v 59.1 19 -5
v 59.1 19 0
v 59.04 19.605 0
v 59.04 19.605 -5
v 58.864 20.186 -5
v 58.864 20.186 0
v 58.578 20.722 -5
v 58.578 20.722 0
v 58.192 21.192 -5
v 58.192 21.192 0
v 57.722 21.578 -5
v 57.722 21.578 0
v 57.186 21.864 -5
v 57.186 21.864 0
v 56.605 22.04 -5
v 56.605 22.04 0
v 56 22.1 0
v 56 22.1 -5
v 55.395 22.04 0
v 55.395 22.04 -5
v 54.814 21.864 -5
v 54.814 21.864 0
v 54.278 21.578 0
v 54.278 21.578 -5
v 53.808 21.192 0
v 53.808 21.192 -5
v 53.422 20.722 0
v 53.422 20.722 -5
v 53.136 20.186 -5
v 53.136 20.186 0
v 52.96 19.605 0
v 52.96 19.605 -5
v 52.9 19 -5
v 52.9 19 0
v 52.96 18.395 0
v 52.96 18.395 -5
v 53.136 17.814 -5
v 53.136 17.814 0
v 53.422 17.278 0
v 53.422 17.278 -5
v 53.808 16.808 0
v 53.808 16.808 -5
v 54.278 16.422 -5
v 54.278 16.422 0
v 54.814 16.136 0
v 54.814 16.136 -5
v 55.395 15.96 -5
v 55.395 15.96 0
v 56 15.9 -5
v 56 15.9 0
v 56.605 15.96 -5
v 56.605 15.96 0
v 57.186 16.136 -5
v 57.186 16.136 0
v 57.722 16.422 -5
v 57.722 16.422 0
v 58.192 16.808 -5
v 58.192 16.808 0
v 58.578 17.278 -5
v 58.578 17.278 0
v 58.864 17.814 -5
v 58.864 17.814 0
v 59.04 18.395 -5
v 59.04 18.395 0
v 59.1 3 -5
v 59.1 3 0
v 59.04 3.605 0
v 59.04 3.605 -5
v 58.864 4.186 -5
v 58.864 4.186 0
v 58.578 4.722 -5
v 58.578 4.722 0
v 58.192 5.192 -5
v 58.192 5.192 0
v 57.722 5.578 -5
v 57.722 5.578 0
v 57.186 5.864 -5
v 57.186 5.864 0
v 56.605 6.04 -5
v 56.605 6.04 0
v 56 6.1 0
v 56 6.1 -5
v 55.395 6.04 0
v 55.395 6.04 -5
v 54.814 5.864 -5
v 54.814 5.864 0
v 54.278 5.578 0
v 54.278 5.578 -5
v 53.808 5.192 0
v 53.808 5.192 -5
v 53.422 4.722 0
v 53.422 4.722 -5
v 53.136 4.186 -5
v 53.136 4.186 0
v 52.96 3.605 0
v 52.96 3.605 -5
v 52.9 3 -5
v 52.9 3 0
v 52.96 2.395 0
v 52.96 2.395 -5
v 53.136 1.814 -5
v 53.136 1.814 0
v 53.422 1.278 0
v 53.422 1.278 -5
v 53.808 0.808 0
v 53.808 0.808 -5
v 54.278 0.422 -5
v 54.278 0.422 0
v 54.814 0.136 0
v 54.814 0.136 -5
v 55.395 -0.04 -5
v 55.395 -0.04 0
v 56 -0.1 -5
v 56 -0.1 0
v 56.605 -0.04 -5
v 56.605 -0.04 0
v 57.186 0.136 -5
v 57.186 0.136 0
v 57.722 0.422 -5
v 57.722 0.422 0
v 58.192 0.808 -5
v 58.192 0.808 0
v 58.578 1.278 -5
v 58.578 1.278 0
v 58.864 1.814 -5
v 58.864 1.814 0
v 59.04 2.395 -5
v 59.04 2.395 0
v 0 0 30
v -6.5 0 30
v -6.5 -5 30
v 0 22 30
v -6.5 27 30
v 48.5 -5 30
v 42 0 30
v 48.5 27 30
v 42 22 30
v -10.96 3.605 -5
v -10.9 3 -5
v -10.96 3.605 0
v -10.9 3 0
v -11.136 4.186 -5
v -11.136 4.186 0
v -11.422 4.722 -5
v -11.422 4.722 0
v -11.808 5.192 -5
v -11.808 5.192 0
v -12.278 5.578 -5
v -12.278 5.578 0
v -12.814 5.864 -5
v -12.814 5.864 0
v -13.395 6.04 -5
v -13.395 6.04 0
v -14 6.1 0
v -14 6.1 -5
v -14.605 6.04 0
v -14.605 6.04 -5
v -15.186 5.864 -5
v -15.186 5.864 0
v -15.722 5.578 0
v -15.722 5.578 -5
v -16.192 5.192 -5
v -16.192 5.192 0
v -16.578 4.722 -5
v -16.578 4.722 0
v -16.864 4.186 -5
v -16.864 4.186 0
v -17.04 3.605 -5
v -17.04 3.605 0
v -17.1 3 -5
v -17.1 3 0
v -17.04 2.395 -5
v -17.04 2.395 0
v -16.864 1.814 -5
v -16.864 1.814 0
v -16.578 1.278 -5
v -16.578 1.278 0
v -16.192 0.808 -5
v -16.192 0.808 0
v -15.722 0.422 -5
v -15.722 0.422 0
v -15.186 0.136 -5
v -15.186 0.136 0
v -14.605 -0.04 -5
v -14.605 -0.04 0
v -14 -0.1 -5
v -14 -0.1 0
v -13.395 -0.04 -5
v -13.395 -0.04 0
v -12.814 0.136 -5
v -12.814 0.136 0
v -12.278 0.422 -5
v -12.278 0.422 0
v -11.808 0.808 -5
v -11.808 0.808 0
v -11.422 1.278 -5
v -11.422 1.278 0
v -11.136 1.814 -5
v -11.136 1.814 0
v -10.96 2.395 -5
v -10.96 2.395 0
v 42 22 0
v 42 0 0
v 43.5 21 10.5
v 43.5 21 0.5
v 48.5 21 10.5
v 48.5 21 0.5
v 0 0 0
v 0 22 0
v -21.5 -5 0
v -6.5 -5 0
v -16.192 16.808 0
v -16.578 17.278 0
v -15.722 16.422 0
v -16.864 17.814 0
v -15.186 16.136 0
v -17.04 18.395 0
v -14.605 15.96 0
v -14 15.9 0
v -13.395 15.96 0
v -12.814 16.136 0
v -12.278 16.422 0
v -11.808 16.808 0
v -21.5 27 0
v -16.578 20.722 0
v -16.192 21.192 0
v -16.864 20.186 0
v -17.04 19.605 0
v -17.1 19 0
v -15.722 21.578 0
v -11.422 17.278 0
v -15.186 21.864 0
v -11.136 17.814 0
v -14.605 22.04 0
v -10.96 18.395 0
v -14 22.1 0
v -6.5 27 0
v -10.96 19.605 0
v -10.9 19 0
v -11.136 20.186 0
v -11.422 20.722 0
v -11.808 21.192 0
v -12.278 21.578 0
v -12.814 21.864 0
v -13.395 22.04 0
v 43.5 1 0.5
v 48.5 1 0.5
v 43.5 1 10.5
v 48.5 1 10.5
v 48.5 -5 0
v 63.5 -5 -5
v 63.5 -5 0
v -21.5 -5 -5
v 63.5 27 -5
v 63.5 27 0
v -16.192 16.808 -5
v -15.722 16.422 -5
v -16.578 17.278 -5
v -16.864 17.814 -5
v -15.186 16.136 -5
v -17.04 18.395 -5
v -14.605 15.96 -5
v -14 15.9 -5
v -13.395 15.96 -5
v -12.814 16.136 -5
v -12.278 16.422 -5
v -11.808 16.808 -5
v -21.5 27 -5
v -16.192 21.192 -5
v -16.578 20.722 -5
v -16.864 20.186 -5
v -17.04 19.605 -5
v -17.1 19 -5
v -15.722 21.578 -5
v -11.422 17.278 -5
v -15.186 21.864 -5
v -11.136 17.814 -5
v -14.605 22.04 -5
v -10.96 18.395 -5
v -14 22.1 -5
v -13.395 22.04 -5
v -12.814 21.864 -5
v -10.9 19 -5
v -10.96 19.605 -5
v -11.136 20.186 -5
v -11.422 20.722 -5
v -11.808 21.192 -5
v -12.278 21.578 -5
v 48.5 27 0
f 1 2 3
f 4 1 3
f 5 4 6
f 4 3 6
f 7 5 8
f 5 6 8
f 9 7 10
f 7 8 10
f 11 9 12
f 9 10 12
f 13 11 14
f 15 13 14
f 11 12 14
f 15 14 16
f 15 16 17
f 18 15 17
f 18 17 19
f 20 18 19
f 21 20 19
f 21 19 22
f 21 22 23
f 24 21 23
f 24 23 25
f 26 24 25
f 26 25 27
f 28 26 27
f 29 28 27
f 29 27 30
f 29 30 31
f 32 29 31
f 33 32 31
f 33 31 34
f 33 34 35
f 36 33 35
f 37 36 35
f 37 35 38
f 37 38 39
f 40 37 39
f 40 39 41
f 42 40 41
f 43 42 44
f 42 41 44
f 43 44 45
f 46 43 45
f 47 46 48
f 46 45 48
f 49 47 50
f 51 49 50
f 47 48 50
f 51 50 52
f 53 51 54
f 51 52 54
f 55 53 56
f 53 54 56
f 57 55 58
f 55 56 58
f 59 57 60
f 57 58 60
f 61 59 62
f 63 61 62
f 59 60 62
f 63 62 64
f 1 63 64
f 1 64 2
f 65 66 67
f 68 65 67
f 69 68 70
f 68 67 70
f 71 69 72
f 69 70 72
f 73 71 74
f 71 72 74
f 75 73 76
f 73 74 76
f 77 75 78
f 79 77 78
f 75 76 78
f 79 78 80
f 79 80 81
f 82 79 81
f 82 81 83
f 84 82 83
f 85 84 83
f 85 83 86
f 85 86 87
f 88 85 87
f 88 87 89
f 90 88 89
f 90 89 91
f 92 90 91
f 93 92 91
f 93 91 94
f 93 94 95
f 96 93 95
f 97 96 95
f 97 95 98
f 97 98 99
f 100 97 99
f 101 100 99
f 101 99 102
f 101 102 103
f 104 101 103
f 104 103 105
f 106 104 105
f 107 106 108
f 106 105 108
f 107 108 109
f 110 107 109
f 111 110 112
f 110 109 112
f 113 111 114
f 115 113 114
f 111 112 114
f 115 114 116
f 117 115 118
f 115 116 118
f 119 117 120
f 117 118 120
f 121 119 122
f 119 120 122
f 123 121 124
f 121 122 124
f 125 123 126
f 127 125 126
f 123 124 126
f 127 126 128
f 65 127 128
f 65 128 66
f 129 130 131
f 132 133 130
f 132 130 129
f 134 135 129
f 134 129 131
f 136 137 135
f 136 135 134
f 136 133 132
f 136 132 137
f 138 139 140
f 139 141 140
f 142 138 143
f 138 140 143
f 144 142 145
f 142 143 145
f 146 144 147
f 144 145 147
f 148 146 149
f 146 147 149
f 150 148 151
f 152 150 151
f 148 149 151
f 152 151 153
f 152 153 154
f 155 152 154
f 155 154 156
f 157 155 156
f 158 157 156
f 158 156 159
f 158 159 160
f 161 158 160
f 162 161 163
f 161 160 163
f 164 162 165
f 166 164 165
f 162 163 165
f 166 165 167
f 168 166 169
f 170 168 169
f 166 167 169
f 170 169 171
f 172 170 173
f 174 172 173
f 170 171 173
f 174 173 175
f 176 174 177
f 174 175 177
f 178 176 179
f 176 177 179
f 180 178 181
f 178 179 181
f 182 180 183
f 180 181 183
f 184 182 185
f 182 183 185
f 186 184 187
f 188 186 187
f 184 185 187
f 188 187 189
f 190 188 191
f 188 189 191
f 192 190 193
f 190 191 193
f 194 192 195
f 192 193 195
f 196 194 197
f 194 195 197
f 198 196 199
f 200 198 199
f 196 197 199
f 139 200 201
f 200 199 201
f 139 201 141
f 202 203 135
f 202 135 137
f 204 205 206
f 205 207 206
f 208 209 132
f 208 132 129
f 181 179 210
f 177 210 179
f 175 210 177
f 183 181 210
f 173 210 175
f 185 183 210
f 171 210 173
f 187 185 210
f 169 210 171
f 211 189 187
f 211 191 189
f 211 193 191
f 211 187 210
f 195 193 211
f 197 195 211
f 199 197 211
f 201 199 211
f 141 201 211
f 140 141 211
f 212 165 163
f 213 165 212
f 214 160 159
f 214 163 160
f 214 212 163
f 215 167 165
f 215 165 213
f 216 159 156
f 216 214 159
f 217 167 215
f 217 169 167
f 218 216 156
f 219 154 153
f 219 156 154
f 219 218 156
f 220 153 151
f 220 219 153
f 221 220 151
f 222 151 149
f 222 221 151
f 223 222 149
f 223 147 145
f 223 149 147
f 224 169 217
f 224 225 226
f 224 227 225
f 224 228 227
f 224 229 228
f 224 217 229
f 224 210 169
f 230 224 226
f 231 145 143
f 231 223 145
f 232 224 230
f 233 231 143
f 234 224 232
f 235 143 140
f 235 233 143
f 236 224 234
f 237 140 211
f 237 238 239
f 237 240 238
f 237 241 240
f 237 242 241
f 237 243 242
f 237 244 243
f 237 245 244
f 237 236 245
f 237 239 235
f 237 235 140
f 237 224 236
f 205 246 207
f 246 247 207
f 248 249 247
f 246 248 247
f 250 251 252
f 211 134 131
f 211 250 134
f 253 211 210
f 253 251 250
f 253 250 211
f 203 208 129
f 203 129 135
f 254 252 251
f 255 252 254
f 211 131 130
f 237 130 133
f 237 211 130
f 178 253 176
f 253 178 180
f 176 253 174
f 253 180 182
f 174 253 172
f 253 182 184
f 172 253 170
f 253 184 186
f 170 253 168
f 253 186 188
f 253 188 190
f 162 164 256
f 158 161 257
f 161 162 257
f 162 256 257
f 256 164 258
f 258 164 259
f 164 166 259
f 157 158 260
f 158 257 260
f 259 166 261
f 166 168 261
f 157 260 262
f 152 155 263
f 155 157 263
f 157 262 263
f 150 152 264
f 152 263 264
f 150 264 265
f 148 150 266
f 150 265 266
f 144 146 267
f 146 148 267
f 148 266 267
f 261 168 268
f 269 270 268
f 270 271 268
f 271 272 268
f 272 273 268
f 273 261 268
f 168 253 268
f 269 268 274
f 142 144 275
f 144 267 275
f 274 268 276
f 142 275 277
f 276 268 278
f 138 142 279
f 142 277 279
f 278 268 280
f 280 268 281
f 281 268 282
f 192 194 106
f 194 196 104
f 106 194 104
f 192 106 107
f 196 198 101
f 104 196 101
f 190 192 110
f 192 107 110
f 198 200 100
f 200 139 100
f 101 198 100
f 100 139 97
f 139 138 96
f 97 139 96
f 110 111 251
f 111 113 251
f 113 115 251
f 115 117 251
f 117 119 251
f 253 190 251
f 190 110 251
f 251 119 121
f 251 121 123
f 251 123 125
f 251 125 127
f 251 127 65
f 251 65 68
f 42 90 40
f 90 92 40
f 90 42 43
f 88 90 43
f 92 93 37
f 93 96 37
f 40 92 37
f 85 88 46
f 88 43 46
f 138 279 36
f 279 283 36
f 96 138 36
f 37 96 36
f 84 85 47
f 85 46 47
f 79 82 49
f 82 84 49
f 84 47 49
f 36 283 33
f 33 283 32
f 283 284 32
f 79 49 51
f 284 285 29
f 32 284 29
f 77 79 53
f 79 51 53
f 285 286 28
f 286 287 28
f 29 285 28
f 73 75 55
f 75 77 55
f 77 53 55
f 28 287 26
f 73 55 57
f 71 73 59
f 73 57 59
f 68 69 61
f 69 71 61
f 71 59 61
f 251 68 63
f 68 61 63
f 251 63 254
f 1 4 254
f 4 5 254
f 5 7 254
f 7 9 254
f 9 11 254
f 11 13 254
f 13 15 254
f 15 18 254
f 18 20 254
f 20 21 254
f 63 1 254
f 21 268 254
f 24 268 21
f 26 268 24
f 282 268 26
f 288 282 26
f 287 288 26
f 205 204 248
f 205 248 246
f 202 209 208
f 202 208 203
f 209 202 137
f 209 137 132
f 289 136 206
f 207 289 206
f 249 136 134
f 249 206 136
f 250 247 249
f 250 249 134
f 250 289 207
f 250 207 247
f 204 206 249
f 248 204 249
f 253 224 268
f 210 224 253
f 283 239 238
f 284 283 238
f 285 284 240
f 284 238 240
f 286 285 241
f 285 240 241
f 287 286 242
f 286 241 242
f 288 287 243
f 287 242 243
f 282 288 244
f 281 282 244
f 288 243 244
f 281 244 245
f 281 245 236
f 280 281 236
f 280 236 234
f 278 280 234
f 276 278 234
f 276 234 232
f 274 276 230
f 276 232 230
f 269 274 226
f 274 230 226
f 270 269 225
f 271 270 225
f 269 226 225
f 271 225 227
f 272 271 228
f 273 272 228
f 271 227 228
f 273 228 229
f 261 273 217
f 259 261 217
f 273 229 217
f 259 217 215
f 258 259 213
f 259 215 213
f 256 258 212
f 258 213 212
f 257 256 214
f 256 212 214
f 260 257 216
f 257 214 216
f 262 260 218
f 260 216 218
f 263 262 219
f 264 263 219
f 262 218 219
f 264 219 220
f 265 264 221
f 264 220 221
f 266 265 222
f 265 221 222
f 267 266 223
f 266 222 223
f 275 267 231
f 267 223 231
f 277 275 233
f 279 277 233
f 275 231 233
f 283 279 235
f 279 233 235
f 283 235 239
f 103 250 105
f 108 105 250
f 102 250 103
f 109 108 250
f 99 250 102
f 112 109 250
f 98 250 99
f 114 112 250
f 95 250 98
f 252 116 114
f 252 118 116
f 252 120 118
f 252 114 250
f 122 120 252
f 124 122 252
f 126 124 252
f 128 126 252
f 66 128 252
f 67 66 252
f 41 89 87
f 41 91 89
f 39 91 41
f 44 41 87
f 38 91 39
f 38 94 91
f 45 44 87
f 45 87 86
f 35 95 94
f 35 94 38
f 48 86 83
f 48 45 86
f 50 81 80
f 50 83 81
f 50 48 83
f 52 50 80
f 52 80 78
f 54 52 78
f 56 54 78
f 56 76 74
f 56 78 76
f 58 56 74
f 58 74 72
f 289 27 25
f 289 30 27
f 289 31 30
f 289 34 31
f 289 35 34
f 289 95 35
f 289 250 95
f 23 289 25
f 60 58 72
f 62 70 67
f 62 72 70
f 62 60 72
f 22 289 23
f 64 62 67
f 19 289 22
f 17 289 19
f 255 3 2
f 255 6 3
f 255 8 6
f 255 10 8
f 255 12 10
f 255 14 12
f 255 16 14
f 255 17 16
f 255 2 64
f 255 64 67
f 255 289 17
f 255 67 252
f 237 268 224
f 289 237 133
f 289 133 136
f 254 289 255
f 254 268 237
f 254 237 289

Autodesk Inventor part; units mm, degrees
ref_plane "YZ Plane" through (0, 0, 0) normal (1, 0, 0) x (0, 1, 0)
ref_plane "XZ Plane" through (0, 0, 0) normal (0, 1, 0) x (-1, 0, 0)
ref_plane "XY Plane" through (0, 0, 0) normal (0, 0, 1) x (1, 0, 0)
sketch "Sketch1" plane through (0, 0, 0) normal (0, 0, 1) x (1, 0, 0)
  line L0 (0, 0) -> (42, 0)
  line L1 (42, 0) -> (42, 22)
  line L2 (42, 22) -> (0, 22)
  line L3 (0, 22) -> (0, 0)
  line L4 (0, 0) -> (-6.5, 0)
  line L5 (-6.5, 0) -> (-6.5, 27)
  line L6 (-6.5, 27) -> (48.5, 27)
  line L7 (48.5, 27) -> (48.5, -5)
  line L8 (48.5, -5) -> (-6.5, -5)
  line L9 (-6.5, -5) -> (-6.5, 0)
  line L10 (-6.5, 27) -> (-21.5, 27)
  line L11 (-21.5, 27) -> (-21.5, -5)
  line L12 (-21.5, -5) -> (-6.5, -5)
  line L13 (48.5, -5) -> (63.5, -5)
  line L14 (63.5, -5) -> (63.5, 27)
  line L15 (63.5, 27) -> (48.5, 27)
  circle A0 centre (-14, 19) radius 3.1
  circle A1 centre (-14, 3) radius 3.1
  line L16 (21, 22) -> (21, 19)
  circle A2 centre (56, 19) radius 3.1
  circle A3 centre (56, 3) radius 3.1
  dimension "d0" = 42
  dimension "d1" = 22
  dimension "d2" = 6.5
  dimension "d3" = 27
  dimension "d4" = 55
  dimension "d5" = 32
  dimension "d11" = 15
  dimension "d12" = 15
  dimension "d13" = 32
  dimension "d16" = 7.5
  dimension "d17" = 7.5
  dimension "d18" = 8
  dimension "d19" = 8
  dimension "d20" = 6.2
  dimension "d21" = 6.2
extrude "Extrusion1" add sketch "Sketch1" along normal blind 30 contours L5 L6 L7 L8 L9
extrude "Extrusion2" add sketch "Sketch1" against normal blind 5 contours L3 L2 L1 L0 | L5 L6 L7 L8 L9
extrude "Extrusion3" add sketch "Sketch1" against normal blind 5 contours L9 L12 L11 L10 L5 | L15 L14 L13 L7
sketch "Sketch2" plane through (48.5, -5, 30) normal (1, 0, 0) x (0, 0, -1)
  line L0 (29.5, 26) -> (19.5, 26) projected
  line L1 (19.5, 26) -> (19.5, 6) projected
  line L2 (19.5, 6) -> (29.5, 6) projected
  line L3 (29.5, 6) -> (29.5, 26) projected
  point P0 (30, 5)
extrude "Extrusion4" cut sketch "Sketch2" against normal blind 5
equation "\"d2\" = -0.5 * d0 + 0.5 * d4"
equation "\"d21\" = d20"
properties part number "base"
